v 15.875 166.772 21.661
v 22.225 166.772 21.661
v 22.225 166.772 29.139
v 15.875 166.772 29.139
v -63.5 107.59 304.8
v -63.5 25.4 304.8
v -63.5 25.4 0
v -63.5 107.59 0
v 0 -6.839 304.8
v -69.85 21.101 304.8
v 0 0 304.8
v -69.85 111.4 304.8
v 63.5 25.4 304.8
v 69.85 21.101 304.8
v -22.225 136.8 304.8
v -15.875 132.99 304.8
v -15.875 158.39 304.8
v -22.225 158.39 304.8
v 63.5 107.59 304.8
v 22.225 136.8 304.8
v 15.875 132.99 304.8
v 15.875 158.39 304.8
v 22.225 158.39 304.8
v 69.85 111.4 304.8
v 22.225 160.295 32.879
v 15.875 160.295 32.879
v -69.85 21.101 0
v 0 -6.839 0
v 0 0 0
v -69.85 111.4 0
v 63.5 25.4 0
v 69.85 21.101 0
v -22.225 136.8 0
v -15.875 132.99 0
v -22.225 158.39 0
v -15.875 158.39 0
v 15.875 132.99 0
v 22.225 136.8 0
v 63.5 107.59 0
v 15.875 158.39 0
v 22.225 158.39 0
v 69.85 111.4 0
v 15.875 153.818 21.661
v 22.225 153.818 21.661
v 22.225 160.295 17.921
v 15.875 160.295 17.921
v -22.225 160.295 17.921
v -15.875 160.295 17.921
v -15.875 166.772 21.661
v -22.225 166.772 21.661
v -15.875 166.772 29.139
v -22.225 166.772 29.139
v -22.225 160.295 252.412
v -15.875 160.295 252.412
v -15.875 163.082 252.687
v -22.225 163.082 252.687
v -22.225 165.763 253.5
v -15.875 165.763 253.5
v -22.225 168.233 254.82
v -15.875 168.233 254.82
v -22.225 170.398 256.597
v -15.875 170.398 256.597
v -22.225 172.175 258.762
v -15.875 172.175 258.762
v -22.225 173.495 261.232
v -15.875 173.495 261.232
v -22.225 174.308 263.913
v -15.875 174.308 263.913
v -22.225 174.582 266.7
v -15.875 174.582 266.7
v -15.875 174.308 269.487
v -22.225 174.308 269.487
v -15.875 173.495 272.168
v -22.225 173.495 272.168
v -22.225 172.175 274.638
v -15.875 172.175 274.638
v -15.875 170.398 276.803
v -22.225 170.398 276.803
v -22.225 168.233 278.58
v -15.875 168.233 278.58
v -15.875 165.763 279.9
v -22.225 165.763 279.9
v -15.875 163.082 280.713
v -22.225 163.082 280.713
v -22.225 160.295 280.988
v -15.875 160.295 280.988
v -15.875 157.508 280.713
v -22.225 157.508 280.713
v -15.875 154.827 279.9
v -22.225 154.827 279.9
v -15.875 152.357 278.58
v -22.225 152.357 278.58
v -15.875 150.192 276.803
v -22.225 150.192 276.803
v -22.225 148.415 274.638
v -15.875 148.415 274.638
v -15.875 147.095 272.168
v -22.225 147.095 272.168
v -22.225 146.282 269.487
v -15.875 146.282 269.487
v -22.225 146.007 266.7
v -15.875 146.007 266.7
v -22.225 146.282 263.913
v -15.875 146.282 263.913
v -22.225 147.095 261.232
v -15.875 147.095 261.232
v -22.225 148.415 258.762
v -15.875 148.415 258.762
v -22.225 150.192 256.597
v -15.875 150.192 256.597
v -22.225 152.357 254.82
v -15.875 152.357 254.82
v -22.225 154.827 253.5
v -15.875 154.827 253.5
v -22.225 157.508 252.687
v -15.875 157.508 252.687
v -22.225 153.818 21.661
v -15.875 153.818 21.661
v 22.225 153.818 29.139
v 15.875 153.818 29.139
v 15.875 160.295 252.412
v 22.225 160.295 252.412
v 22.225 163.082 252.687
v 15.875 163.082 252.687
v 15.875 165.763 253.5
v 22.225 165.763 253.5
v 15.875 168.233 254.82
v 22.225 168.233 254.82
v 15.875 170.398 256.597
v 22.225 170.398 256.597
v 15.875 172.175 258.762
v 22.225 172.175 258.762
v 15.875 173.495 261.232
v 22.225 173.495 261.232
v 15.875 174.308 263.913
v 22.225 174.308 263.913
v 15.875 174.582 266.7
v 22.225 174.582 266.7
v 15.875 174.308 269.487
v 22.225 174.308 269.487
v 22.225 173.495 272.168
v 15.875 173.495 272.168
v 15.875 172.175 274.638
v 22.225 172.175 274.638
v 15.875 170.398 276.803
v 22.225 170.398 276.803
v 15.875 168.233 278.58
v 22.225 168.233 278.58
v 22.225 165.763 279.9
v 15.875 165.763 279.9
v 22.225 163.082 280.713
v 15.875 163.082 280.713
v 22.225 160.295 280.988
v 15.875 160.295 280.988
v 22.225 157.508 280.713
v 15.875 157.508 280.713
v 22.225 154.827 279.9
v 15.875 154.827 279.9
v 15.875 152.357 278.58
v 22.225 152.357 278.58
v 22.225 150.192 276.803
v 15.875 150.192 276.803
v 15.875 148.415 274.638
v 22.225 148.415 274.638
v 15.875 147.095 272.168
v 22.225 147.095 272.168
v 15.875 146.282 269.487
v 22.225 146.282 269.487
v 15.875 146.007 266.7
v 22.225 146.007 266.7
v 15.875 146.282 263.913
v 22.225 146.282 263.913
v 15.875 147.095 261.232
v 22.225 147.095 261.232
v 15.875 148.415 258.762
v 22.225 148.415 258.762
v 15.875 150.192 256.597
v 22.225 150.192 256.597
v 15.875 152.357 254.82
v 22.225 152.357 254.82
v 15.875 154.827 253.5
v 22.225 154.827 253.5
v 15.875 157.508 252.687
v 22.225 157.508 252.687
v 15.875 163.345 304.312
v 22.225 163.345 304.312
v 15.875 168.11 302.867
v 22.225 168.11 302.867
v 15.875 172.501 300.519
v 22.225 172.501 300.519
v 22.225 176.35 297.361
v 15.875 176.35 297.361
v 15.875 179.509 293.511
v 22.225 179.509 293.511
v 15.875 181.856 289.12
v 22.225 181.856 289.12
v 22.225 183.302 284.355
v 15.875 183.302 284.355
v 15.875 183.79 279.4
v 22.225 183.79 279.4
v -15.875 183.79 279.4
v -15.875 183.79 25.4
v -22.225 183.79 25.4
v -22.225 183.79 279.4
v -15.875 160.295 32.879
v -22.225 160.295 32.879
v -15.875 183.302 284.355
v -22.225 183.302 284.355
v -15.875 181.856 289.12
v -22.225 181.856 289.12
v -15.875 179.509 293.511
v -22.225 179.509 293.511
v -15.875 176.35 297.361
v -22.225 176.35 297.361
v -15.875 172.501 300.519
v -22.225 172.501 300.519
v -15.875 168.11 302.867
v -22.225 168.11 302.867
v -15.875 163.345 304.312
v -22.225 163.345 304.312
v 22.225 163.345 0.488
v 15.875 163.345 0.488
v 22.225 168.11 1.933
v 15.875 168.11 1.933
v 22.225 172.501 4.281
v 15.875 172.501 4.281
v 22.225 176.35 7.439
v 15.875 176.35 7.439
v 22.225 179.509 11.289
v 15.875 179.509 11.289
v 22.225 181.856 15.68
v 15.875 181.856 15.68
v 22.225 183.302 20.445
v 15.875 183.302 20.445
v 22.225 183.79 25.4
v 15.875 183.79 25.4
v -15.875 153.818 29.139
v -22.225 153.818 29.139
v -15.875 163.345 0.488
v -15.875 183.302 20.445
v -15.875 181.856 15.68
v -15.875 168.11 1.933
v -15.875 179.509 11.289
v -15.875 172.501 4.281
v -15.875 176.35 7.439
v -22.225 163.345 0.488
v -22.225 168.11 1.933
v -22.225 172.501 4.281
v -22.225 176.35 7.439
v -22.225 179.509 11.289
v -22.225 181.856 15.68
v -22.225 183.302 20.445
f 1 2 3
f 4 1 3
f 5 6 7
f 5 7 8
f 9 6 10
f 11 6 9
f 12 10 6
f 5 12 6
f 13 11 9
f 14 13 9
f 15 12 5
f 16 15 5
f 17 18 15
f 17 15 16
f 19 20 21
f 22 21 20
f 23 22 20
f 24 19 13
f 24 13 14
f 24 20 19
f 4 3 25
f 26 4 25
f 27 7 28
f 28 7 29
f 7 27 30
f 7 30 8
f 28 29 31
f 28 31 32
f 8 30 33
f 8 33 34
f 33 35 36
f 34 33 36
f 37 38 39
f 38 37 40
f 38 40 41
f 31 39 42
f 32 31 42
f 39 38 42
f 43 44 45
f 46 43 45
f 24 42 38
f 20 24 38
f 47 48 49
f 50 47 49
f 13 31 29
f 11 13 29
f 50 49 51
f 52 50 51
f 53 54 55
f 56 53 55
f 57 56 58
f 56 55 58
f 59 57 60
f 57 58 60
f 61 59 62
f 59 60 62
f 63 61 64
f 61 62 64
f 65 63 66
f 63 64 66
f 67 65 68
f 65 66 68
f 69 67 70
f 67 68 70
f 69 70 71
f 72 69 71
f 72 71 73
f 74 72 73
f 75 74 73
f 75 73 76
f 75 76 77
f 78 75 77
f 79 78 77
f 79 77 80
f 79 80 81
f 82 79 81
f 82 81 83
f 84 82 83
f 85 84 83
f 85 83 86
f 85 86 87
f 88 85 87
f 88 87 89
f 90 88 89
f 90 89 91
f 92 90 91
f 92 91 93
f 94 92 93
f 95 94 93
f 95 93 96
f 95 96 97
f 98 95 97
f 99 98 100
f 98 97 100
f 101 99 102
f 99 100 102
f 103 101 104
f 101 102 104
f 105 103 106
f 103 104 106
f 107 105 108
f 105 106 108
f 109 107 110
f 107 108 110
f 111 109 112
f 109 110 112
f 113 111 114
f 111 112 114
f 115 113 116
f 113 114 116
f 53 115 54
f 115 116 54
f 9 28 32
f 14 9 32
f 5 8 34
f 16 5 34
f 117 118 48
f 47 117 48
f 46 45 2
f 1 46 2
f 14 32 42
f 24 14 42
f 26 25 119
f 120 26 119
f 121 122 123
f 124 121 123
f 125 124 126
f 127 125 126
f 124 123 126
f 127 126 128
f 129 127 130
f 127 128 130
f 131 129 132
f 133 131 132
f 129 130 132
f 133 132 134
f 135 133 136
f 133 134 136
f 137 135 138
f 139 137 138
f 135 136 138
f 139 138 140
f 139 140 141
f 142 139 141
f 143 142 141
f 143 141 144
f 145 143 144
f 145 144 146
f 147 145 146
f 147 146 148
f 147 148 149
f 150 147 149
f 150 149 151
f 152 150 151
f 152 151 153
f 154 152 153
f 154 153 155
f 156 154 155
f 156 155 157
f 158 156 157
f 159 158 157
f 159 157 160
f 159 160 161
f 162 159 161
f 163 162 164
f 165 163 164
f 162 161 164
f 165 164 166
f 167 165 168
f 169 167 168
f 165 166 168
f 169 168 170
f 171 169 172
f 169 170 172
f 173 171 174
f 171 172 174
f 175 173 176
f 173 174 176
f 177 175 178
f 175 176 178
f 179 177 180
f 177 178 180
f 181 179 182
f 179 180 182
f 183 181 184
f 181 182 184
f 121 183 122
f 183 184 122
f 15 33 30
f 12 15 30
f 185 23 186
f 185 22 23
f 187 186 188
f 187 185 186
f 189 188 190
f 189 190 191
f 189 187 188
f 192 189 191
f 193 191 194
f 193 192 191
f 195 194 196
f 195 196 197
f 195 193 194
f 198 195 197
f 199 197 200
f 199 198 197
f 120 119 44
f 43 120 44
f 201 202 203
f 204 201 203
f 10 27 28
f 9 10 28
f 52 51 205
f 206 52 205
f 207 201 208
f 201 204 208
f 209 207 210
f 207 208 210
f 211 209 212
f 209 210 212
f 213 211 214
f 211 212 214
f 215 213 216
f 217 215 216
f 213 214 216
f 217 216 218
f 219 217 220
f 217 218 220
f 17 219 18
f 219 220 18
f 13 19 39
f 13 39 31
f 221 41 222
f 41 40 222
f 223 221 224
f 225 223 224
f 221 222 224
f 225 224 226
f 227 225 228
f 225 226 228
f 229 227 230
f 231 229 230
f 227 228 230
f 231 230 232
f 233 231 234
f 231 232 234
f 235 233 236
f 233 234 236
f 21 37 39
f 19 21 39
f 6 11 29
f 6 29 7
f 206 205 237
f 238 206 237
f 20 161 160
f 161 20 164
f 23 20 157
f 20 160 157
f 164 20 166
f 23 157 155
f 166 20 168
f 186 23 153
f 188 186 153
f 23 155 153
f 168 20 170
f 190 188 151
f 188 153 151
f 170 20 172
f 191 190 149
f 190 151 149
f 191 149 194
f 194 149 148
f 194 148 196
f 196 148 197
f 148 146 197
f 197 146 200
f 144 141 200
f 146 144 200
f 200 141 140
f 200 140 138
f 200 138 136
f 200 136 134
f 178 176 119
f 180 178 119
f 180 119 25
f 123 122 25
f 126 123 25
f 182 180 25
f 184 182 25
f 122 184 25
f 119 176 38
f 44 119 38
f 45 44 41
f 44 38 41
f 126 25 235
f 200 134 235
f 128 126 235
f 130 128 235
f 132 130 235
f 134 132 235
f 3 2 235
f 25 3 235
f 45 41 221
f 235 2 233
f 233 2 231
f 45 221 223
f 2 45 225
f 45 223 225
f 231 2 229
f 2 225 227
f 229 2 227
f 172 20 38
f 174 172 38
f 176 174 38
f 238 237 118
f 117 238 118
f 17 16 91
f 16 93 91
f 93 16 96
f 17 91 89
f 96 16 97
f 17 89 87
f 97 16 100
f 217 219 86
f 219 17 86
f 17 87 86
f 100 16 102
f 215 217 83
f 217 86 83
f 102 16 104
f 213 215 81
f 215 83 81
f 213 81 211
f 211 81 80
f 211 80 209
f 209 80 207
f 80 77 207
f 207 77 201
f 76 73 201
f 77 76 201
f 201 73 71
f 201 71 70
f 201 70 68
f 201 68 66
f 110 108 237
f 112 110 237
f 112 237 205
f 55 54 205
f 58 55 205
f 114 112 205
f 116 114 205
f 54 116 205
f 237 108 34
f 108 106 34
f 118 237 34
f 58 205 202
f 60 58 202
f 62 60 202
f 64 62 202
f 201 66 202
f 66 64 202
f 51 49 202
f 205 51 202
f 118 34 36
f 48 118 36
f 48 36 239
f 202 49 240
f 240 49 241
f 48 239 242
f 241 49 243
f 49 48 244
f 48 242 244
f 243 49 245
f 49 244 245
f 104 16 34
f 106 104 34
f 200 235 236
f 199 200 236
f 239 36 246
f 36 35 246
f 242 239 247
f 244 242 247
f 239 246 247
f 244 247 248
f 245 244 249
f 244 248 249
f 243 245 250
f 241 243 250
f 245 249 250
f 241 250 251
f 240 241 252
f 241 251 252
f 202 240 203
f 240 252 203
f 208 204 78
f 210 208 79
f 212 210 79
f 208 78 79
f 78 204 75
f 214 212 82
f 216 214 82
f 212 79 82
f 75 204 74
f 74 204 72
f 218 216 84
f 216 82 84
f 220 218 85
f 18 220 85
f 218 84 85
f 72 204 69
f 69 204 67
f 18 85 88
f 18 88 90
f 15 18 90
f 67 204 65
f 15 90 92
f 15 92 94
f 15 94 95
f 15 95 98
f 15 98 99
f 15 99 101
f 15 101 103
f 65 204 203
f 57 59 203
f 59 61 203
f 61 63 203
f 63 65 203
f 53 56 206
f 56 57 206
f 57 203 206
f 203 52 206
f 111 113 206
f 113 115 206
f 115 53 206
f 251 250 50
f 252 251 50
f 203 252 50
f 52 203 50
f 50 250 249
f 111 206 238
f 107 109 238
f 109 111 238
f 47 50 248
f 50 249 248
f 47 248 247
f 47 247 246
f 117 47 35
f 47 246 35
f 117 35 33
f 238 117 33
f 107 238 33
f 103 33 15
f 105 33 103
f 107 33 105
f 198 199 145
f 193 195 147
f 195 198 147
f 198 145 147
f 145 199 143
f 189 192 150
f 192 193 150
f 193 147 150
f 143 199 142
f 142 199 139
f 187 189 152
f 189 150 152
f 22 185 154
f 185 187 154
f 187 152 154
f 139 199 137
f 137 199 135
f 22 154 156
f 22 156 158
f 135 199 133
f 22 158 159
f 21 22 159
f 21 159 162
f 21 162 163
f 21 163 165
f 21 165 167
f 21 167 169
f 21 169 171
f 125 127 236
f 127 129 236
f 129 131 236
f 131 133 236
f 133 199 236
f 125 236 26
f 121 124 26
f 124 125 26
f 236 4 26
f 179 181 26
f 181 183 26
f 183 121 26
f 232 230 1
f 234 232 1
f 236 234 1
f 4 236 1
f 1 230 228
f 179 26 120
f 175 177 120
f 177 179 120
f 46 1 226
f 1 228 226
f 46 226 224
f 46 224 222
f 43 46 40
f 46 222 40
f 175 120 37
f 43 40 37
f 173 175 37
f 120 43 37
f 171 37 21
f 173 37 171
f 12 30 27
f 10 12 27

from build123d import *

# Parameters (mm, degrees)
BOSS_EXTRUDE1_DEPTH = 304.8
SKETCH2_R           = 14.2875
CUT_EXTRUDE1_DEPTH  = 304.8
FILLET1_R           = 25.4
FILLET2_R           = 25.4


with BuildPart() as part:
    # Sketch1 → Boss-Extrude1 (new body)
    with BuildSketch(Plane.XY):
        Polygon((0, 0), (-63.5, 25.4), (-63.5, 107.589933746), (-15.875, 132.989933746), (-15.875, 183.789933746), (-22.225, 183.789933746), (-22.225, 136.799933746), (-69.85, 111.399933746), (-69.85, 21.100840695), (0, -6.839159305), (69.85, 21.100840695), (69.85, 111.399933746), (22.225, 136.799933746), (22.225, 183.789933746), (15.875, 183.789933746), (15.875, 132.989933746), (63.5, 107.589933746), (63.5, 25.4), align=None)
    extrude(amount=BOSS_EXTRUDE1_DEPTH)

    # Sketch2 → Cut-Extrude1 (cut)
    with BuildSketch(Plane(origin=(22.225, 0, 0), x_dir=(0, 0, -1), z_dir=(1, 0, 0))):
        with Locations((-266.7, 160.294933746)):
            Circle(SKETCH2_R)
        Polygon((-17.921004613, 160.294933746), (-21.660502306, 166.771933746), (-29.139497694, 166.771933746), (-32.878995387, 160.294933746), (-29.139497694, 153.817933746), (-21.660502306, 153.817933746), align=None)
    extrude(amount=-CUT_EXTRUDE1_DEPTH, mode=Mode.SUBTRACT)

    # Fillet1
    fillet1_edges = [part.edges().sort_by_distance(p)[0] for p in [
        (19.05, 183.789933746, 0),
        (-19.05, 183.789933746, 0),
    ]]
    fillet(fillet1_edges, radius=FILLET1_R)

    # Fillet2
    fillet2_edges = [part.edges().sort_by_distance(p)[0] for p in [
        (-19.05, 183.789933746, 304.8),
        (19.05, 183.789933746, 304.8),
    ]]
    fillet(fillet2_edges, radius=FILLET2_R)


solid = part.part
